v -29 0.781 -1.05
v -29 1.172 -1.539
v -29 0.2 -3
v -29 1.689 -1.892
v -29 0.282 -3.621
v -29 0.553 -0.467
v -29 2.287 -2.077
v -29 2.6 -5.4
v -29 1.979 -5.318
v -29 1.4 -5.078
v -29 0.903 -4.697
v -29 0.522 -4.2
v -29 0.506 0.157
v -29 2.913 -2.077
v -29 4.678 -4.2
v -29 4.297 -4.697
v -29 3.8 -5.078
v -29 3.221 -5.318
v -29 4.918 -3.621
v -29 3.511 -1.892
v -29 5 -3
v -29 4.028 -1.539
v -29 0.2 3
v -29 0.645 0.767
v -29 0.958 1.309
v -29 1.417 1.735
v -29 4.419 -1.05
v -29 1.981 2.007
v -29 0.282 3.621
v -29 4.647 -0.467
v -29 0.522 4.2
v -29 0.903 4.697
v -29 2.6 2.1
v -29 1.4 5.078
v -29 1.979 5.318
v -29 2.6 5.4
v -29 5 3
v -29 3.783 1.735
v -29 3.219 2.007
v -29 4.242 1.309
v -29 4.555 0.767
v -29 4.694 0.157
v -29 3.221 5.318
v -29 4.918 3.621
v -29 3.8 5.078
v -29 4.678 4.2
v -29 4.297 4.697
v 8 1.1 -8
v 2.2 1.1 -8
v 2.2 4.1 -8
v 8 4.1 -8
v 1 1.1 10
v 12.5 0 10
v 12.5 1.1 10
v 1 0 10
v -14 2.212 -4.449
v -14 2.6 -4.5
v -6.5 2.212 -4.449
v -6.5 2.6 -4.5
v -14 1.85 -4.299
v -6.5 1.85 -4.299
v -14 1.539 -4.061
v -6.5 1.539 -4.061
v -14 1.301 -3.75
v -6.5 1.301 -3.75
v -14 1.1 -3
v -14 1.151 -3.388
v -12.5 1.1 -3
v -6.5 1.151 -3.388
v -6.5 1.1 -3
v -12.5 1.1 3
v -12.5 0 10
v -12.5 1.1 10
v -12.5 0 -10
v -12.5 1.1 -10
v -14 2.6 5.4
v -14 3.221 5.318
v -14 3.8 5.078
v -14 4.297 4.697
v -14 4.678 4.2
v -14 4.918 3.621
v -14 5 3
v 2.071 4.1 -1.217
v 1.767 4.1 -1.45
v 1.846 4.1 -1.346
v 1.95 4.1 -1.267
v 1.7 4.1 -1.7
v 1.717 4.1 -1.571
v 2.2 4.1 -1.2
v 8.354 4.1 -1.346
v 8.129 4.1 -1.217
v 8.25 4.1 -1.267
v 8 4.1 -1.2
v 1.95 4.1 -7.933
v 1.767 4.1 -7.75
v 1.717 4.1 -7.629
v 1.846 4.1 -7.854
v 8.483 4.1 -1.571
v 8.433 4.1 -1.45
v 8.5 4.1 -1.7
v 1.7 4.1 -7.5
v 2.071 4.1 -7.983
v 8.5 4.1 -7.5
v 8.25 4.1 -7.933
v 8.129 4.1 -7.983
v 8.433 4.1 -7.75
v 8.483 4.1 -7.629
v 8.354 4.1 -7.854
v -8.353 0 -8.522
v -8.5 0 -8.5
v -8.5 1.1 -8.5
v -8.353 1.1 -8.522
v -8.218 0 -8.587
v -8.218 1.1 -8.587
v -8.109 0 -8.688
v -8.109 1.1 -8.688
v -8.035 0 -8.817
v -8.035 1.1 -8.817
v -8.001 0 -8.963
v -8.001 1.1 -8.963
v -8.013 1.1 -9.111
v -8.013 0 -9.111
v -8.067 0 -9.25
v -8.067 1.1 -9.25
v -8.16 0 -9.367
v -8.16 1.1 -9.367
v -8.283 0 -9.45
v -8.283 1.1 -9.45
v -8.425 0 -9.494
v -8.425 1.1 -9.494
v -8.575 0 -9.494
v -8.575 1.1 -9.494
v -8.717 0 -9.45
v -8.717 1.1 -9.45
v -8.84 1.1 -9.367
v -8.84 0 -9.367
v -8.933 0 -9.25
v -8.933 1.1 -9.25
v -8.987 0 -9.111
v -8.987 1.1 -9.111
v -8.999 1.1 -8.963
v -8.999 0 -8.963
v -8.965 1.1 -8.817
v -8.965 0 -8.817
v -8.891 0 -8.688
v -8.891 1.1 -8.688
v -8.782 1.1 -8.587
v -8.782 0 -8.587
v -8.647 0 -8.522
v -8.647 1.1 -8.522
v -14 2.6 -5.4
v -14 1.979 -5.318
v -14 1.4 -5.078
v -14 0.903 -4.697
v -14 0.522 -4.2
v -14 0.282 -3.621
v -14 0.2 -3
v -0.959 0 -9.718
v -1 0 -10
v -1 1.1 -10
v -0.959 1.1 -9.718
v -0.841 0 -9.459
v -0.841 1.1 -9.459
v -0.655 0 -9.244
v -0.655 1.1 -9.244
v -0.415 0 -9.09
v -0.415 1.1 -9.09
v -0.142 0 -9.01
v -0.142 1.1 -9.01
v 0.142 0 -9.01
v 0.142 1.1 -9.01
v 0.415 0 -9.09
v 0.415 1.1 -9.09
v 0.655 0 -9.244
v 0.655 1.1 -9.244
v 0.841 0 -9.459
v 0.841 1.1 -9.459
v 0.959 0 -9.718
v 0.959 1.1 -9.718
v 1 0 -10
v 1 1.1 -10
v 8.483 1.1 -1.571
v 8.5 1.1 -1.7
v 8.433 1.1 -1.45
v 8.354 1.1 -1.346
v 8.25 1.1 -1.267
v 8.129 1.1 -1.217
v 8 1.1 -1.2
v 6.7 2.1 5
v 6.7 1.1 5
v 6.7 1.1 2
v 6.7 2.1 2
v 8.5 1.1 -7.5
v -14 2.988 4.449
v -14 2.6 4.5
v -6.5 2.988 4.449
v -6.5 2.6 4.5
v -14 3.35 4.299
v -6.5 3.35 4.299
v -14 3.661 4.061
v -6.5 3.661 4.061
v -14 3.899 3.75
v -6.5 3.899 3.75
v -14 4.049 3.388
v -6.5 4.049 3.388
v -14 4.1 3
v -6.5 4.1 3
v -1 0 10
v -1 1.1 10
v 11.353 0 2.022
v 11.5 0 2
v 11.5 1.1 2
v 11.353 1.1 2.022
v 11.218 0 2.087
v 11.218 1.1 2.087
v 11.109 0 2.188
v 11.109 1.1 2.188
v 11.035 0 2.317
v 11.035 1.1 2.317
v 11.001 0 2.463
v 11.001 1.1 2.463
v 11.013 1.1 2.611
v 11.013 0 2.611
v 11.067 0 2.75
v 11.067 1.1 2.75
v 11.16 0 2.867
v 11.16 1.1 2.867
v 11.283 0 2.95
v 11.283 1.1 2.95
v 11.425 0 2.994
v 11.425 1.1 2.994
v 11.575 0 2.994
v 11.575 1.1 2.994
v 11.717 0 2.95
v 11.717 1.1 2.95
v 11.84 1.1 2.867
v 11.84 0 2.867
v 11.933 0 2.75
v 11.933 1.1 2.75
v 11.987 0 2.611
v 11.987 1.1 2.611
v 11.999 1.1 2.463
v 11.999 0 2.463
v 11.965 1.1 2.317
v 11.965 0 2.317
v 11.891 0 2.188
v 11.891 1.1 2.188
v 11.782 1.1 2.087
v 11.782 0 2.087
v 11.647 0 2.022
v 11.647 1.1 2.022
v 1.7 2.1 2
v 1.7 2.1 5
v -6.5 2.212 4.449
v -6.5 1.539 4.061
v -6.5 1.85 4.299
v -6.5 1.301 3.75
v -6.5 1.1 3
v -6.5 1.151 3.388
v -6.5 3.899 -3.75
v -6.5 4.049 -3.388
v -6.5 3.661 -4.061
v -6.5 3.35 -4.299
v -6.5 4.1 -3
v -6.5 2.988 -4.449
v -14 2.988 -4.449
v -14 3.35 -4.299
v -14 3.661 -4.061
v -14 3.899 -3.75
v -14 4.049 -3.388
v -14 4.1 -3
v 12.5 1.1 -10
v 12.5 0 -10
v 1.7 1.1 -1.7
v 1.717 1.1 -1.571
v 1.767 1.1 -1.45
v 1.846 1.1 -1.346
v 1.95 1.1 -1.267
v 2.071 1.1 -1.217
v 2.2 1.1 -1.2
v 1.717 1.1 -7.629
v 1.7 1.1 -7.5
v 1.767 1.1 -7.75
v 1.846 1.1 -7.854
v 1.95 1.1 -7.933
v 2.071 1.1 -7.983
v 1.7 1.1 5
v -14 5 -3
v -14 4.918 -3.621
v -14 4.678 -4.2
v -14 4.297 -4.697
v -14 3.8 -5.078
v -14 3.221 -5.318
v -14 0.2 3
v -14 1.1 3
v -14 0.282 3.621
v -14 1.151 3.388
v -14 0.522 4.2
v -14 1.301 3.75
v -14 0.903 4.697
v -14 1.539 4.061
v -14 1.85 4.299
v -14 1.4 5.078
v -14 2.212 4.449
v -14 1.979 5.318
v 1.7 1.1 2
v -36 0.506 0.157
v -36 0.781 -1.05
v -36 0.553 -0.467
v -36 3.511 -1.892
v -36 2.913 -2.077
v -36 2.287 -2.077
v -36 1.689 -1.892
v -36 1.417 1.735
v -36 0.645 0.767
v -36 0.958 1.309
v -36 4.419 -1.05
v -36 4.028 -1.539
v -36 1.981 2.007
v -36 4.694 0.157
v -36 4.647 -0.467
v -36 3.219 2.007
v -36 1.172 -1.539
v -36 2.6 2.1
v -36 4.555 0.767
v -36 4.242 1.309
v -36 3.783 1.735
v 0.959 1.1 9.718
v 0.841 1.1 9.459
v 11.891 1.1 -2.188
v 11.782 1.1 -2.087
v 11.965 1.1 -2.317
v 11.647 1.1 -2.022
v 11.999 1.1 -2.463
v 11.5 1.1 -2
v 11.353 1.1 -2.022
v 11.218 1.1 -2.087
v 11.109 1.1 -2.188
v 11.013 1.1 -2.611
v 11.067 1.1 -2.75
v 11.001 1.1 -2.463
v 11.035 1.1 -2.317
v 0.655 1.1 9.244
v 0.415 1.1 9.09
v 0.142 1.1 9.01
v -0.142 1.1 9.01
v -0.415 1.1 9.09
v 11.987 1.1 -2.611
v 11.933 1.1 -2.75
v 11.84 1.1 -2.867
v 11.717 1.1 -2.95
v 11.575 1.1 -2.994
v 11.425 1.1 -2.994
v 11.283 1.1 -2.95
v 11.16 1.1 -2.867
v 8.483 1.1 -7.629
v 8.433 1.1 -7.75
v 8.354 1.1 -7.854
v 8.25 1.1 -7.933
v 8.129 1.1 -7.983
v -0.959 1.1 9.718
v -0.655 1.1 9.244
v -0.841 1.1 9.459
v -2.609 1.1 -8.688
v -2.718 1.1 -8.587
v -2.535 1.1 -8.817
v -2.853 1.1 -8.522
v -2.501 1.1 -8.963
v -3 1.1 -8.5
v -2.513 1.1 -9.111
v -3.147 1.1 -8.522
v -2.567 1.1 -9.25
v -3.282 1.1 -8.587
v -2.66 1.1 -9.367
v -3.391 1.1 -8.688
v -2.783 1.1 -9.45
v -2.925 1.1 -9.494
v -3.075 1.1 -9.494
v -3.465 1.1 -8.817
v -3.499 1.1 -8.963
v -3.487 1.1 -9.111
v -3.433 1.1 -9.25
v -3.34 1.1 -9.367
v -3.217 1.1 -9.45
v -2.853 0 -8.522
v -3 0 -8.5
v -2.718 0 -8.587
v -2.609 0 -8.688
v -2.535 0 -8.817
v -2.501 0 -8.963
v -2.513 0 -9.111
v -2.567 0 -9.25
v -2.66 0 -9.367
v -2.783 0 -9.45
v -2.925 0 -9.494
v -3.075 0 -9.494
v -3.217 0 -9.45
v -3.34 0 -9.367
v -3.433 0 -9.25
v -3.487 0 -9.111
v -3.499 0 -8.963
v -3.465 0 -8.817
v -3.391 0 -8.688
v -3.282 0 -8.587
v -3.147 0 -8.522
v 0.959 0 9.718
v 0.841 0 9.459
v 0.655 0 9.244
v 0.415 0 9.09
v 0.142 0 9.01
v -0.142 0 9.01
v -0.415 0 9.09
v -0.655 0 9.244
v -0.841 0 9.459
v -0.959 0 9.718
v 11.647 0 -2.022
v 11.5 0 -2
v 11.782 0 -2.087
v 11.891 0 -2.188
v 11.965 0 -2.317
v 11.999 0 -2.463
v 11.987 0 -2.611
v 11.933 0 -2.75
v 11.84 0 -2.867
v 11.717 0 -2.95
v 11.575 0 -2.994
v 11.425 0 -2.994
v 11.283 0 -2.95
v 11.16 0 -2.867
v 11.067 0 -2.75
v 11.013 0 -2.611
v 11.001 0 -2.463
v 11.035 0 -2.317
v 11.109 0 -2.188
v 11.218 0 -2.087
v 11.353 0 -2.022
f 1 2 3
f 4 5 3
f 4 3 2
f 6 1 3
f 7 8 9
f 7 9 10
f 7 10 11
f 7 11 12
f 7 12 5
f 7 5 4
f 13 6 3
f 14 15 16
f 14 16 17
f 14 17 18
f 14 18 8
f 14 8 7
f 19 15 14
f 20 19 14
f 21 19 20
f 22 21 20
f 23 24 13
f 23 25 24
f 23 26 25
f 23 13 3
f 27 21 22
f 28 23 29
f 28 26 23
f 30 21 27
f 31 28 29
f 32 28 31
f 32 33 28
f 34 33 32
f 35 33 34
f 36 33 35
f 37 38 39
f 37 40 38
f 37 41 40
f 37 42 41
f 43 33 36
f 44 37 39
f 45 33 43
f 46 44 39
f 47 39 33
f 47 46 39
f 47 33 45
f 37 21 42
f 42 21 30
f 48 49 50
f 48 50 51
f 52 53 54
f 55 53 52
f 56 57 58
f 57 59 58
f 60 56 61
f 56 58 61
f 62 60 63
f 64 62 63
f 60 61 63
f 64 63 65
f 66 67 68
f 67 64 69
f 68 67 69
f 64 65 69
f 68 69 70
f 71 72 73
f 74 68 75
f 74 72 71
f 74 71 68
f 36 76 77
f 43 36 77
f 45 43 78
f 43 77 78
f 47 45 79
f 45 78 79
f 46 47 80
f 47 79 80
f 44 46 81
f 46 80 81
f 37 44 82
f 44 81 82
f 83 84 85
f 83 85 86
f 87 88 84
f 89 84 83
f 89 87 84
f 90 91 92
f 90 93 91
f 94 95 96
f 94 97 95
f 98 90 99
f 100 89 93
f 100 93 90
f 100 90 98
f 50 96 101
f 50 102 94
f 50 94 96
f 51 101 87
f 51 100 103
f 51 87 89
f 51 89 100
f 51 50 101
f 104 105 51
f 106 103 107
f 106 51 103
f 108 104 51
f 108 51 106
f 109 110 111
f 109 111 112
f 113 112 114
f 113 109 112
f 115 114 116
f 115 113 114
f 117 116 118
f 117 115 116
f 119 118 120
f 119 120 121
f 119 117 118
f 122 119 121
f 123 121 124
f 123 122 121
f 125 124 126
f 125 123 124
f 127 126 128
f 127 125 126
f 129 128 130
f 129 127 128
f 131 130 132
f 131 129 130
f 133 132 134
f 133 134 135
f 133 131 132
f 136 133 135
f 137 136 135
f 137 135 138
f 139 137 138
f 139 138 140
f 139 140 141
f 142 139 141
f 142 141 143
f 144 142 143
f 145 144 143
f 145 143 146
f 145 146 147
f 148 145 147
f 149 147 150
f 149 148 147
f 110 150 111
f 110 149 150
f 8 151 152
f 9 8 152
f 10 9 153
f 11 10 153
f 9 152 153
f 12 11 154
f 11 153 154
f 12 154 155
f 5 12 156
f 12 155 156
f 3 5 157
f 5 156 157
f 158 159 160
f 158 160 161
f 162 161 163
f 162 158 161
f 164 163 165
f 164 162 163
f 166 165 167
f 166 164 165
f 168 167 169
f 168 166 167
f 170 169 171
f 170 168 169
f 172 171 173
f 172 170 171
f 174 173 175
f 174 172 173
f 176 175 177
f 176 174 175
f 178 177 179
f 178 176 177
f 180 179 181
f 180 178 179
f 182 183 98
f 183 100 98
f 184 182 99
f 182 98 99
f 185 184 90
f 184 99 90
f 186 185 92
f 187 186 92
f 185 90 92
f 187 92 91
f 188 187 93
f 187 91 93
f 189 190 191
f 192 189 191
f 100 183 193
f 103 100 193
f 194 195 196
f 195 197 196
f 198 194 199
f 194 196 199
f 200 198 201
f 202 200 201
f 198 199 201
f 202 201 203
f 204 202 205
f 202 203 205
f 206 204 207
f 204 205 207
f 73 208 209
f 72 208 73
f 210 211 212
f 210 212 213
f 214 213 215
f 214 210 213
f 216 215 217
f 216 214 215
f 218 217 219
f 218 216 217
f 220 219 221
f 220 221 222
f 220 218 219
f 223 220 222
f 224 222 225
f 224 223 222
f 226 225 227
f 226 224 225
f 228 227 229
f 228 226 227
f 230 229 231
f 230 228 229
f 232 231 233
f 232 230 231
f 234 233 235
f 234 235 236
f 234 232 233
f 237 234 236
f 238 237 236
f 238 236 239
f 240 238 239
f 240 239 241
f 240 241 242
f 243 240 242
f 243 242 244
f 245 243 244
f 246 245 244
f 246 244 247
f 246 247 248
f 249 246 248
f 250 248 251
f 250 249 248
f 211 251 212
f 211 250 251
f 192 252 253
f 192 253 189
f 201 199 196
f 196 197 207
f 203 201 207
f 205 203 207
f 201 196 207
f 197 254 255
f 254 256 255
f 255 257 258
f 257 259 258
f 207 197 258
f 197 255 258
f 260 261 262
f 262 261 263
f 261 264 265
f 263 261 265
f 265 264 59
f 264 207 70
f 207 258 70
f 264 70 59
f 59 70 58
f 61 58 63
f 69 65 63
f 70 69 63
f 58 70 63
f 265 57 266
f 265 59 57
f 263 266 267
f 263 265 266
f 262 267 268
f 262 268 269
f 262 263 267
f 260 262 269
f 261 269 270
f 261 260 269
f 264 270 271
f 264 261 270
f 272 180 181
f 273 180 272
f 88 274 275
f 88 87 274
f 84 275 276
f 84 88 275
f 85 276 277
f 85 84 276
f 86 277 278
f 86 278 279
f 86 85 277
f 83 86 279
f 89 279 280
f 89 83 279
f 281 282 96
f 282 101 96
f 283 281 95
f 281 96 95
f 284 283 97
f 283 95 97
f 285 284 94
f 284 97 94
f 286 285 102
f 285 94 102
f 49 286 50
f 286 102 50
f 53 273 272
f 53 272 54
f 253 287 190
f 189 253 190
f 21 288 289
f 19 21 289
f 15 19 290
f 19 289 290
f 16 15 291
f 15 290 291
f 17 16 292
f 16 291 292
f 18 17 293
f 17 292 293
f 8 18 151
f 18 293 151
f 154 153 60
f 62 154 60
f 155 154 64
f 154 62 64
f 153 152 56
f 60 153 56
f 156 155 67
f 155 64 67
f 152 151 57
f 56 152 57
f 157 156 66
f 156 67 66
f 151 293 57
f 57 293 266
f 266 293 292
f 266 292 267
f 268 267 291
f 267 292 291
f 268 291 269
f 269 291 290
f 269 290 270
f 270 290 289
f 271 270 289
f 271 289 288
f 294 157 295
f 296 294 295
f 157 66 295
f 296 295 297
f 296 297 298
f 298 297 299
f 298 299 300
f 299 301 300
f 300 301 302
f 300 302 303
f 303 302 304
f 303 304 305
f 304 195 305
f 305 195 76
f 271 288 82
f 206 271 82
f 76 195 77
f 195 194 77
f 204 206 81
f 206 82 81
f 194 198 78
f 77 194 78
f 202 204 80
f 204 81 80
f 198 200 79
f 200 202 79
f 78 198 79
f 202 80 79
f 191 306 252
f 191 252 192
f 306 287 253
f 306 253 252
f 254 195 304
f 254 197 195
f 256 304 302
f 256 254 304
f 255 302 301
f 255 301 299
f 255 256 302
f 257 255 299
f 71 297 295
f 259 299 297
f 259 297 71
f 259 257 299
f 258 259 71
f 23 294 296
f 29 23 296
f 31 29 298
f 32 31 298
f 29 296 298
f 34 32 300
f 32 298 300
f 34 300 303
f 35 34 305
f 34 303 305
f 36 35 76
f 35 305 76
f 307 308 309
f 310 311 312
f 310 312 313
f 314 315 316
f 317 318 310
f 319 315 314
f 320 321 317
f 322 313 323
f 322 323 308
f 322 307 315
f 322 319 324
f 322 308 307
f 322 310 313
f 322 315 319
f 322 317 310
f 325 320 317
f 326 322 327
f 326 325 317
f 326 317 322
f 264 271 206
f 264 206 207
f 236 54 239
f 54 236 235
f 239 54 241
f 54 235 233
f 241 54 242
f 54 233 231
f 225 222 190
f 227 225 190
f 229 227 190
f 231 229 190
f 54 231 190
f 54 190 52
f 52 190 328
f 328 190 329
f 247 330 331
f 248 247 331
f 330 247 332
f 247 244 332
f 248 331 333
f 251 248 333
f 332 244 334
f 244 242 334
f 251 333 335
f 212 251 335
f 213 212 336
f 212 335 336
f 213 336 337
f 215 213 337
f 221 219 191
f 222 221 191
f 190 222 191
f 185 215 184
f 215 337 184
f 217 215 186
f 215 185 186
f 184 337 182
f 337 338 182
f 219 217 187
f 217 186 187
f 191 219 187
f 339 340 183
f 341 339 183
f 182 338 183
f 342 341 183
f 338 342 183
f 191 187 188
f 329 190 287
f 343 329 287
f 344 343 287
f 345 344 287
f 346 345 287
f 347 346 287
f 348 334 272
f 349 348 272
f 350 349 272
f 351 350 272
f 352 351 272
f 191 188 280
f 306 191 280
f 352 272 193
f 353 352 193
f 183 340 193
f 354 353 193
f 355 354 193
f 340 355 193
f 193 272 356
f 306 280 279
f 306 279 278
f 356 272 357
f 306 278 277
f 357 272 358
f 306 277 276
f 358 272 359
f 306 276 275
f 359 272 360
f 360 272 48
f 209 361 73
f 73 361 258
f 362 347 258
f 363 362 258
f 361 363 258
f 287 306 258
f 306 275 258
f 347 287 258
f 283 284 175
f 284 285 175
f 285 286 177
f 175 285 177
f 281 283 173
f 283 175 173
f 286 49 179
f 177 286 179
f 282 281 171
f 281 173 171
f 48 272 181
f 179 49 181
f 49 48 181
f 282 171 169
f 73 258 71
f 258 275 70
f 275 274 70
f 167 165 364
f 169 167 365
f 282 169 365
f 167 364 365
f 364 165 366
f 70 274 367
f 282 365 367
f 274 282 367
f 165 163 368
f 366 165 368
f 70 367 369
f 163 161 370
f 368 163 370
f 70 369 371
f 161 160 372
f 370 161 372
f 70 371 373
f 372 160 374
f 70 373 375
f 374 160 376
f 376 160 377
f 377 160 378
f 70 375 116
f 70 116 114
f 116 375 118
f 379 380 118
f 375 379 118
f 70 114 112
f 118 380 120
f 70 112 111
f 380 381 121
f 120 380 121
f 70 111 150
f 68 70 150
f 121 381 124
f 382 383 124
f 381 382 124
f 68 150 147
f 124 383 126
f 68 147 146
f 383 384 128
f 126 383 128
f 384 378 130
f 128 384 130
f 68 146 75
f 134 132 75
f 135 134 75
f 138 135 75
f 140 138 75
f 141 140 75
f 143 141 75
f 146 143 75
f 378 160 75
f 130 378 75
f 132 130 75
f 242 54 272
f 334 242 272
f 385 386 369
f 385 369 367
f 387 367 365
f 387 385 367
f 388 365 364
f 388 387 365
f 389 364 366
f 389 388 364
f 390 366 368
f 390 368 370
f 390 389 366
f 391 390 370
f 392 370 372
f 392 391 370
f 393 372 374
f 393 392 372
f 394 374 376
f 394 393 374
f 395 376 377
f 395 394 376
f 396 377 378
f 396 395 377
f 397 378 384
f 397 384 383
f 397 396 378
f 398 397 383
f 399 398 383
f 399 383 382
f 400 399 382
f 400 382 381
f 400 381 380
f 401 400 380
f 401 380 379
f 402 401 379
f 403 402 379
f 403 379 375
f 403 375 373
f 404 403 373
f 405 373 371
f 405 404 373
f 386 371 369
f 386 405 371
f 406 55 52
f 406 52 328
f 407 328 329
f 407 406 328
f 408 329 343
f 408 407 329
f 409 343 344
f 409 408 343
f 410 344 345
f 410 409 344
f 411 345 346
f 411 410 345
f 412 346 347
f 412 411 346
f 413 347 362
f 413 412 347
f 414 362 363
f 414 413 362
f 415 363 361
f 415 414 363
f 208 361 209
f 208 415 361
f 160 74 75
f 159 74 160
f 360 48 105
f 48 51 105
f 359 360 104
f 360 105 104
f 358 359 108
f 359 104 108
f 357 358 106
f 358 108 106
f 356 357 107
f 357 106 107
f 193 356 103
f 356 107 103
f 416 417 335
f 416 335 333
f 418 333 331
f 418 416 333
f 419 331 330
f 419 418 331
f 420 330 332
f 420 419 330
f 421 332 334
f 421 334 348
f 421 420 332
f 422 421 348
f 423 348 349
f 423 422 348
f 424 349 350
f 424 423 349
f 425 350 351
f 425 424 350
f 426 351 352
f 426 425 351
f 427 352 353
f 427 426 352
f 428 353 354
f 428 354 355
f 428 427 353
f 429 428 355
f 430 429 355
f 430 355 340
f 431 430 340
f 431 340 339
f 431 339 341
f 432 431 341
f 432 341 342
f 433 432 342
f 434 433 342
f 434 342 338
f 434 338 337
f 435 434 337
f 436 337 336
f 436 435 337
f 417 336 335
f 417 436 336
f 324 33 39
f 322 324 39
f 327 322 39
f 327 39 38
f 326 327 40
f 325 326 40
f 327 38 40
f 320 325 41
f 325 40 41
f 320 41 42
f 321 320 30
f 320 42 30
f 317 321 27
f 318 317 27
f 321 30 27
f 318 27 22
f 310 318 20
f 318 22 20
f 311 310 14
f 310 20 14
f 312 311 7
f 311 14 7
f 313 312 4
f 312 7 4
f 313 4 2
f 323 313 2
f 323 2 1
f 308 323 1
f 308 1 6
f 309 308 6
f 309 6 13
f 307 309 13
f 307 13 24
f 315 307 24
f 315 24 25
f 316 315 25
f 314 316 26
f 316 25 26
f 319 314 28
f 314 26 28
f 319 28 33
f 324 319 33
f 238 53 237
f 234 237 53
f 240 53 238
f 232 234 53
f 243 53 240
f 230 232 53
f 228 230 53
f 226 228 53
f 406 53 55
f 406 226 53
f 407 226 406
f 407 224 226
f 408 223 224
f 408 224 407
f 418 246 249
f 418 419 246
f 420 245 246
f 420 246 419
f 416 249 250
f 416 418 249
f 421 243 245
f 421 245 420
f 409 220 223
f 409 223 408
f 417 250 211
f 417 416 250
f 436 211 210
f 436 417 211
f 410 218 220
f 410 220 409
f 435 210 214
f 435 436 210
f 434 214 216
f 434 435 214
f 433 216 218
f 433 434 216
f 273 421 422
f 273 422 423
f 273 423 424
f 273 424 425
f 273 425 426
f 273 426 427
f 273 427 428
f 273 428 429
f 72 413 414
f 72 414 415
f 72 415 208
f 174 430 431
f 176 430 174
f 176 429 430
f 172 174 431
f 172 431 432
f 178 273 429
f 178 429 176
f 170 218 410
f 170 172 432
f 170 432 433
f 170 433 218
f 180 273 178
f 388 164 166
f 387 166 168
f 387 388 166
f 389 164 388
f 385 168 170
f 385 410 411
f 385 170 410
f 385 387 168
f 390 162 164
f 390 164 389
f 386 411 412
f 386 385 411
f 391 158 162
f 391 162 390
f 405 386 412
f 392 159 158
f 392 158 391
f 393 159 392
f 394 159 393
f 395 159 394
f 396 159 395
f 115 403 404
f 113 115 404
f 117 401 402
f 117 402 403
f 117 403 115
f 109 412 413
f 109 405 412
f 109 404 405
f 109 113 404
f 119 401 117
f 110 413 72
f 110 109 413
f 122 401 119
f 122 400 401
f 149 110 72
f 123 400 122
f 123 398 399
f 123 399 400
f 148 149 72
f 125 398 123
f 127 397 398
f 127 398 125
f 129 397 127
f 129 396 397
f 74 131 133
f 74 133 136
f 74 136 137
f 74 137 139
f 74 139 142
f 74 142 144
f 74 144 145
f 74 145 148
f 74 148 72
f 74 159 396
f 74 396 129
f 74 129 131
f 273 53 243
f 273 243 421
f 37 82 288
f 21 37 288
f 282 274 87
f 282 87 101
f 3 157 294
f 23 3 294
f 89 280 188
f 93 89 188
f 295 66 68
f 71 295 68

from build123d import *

# Parameters (mm, degrees)
CROQUIS1_R              = 0.5
SALIENTE_EXTRUIR1_DEPTH = 1.1
CROQUIS2_W              = 7.5
CROQUIS2_H              = 9
SALIENTE_EXTRUIR2_DEPTH = 3
REDONDEO1_R             = 1.5
CROQUIS3_W              = 6.8
CROQUIS3_H              = 6.8
SALIENTE_EXTRUIR3_DEPTH = 3
REDONDEO2_R             = 0.5
CROQUIS4_W              = 5
CROQUIS4_H              = 3
SALIENTE_EXTRUIR4_DEPTH = 1
SALIENTE_EXTRUIR5_DEPTH = 15
CROQUIS7_R              = 2.1
SALIENTE_EXTRUIR6_DEPTH = 7


with BuildPart() as part:
    # Croquis1 → Saliente-Extruir1 (new body)
    with BuildSketch(Plane(origin=(0, 0, 0), x_dir=(1, 0, 0), z_dir=(0, 1, 0))):
        with BuildLine():
            Line((-12.5, 10), (-1, 10))
            ThreePointArc((-1, 10), (0, 9), (1, 10))
            Line((1, 10), (12.5, 10))
            Line((12.5, 10), (12.5, -10))
            Line((12.5, -10), (1, -10))
            ThreePointArc((1, -10), (0, -9), (-1, -10))
            Line((-1, -10), (-12.5, -10))
            Line((-12.5, -10), (-12.5, 10))
        make_face()
        with Locations(Location((11.5, 2.5, 0), (0, 0, 270))):
            Circle(CROQUIS1_R, mode=Mode.SUBTRACT)
        with Locations(Location((11.5, -2.5, 0), (0, 0, 90))):
            Circle(CROQUIS1_R, mode=Mode.SUBTRACT)
        with Locations(Location((-8.5, 9, 0), (0, 0, 270))):
            Circle(CROQUIS1_R, mode=Mode.SUBTRACT)
        with Locations(Location((-3, 9, 0), (0, 0, 270))):
            Circle(CROQUIS1_R, mode=Mode.SUBTRACT)
    extrude(amount=SALIENTE_EXTRUIR1_DEPTH)


with BuildPart() as body_2:
    # Croquis2 → Saliente-Extruir2 (new body)
    with BuildSketch(Plane(origin=(0, 1.1, 0), x_dir=(1, 0, 0), z_dir=(0, 1, 0))):
        with Locations((-10.25, 0)):
            Rectangle(CROQUIS2_W, CROQUIS2_H)
    extrude(amount=SALIENTE_EXTRUIR2_DEPTH)

    # Redondeo1
    redondeo1_edges = [body_2.edges().sort_by_distance(p)[0] for p in [
        (-10.25, 1.1, -4.5),
        (-10.25, 4.1, -4.5),
        (-10.25, 1.1, 4.5),
        (-10.25, 4.1, 4.5),
    ]]
    fillet(redondeo1_edges, radius=REDONDEO1_R - 0.0001)  # a hair under: the kernel refuses the full size

    # Combinar1: union part
    add(part.part)

    # Croquis3 → Saliente-Extruir3 (add)
    with BuildSketch(Plane(origin=(0, 1.1, 0), x_dir=(1, 0, 0), z_dir=(0, 1, 0))):
        with Locations((5.1, 4.6)):
            Rectangle(CROQUIS3_W, CROQUIS3_H)
    extrude(amount=SALIENTE_EXTRUIR3_DEPTH)

    # Redondeo2
    redondeo2_edges = [body_2.edges().sort_by_distance(p)[0] for p in [
        (8.5, 2.6, -1.2),
        (8.5, 2.6, -8),
        (1.7, 2.6, -8),
        (1.7, 2.6, -1.2),
    ]]
    fillet(redondeo2_edges, radius=REDONDEO2_R)

    # Croquis4 → Saliente-Extruir4 (add)
    with BuildSketch(Plane(origin=(0, 1.1, 0), x_dir=(1, 0, 0), z_dir=(0, 1, 0))):
        with Locations((4.2, -3.5)):
            Rectangle(CROQUIS4_W, CROQUIS4_H)
    extrude(amount=SALIENTE_EXTRUIR4_DEPTH)

    # Croquis6 → Saliente-Extruir5 (add)
    with BuildSketch(Plane.ZY.offset(14)):
        with BuildLine():
            Line((-3, 0.2), (3, 0.2))
            ThreePointArc((3, 0.2), (4.697056275, 0.902943725), (5.4, 2.6))
            ThreePointArc((5.4, 2.6), (4.697056275, 4.297056275), (3, 5))
            Line((3, 5), (-3, 5))
            ThreePointArc((-3, 5), (-4.697056275, 4.297056275), (-5.4, 2.6))
            ThreePointArc((-5.4, 2.6), (-4.697056275, 0.902943725), (-3, 0.2))
        make_face()
    extrude(amount=SALIENTE_EXTRUIR5_DEPTH)

    # Croquis7 → Saliente-Extruir6 (add)
    with BuildSketch(Plane.ZY.offset(29)):
        with Locations((0, 2.6)):
            Circle(CROQUIS7_R)
    extrude(amount=SALIENTE_EXTRUIR6_DEPTH)


solid = body_2.part
